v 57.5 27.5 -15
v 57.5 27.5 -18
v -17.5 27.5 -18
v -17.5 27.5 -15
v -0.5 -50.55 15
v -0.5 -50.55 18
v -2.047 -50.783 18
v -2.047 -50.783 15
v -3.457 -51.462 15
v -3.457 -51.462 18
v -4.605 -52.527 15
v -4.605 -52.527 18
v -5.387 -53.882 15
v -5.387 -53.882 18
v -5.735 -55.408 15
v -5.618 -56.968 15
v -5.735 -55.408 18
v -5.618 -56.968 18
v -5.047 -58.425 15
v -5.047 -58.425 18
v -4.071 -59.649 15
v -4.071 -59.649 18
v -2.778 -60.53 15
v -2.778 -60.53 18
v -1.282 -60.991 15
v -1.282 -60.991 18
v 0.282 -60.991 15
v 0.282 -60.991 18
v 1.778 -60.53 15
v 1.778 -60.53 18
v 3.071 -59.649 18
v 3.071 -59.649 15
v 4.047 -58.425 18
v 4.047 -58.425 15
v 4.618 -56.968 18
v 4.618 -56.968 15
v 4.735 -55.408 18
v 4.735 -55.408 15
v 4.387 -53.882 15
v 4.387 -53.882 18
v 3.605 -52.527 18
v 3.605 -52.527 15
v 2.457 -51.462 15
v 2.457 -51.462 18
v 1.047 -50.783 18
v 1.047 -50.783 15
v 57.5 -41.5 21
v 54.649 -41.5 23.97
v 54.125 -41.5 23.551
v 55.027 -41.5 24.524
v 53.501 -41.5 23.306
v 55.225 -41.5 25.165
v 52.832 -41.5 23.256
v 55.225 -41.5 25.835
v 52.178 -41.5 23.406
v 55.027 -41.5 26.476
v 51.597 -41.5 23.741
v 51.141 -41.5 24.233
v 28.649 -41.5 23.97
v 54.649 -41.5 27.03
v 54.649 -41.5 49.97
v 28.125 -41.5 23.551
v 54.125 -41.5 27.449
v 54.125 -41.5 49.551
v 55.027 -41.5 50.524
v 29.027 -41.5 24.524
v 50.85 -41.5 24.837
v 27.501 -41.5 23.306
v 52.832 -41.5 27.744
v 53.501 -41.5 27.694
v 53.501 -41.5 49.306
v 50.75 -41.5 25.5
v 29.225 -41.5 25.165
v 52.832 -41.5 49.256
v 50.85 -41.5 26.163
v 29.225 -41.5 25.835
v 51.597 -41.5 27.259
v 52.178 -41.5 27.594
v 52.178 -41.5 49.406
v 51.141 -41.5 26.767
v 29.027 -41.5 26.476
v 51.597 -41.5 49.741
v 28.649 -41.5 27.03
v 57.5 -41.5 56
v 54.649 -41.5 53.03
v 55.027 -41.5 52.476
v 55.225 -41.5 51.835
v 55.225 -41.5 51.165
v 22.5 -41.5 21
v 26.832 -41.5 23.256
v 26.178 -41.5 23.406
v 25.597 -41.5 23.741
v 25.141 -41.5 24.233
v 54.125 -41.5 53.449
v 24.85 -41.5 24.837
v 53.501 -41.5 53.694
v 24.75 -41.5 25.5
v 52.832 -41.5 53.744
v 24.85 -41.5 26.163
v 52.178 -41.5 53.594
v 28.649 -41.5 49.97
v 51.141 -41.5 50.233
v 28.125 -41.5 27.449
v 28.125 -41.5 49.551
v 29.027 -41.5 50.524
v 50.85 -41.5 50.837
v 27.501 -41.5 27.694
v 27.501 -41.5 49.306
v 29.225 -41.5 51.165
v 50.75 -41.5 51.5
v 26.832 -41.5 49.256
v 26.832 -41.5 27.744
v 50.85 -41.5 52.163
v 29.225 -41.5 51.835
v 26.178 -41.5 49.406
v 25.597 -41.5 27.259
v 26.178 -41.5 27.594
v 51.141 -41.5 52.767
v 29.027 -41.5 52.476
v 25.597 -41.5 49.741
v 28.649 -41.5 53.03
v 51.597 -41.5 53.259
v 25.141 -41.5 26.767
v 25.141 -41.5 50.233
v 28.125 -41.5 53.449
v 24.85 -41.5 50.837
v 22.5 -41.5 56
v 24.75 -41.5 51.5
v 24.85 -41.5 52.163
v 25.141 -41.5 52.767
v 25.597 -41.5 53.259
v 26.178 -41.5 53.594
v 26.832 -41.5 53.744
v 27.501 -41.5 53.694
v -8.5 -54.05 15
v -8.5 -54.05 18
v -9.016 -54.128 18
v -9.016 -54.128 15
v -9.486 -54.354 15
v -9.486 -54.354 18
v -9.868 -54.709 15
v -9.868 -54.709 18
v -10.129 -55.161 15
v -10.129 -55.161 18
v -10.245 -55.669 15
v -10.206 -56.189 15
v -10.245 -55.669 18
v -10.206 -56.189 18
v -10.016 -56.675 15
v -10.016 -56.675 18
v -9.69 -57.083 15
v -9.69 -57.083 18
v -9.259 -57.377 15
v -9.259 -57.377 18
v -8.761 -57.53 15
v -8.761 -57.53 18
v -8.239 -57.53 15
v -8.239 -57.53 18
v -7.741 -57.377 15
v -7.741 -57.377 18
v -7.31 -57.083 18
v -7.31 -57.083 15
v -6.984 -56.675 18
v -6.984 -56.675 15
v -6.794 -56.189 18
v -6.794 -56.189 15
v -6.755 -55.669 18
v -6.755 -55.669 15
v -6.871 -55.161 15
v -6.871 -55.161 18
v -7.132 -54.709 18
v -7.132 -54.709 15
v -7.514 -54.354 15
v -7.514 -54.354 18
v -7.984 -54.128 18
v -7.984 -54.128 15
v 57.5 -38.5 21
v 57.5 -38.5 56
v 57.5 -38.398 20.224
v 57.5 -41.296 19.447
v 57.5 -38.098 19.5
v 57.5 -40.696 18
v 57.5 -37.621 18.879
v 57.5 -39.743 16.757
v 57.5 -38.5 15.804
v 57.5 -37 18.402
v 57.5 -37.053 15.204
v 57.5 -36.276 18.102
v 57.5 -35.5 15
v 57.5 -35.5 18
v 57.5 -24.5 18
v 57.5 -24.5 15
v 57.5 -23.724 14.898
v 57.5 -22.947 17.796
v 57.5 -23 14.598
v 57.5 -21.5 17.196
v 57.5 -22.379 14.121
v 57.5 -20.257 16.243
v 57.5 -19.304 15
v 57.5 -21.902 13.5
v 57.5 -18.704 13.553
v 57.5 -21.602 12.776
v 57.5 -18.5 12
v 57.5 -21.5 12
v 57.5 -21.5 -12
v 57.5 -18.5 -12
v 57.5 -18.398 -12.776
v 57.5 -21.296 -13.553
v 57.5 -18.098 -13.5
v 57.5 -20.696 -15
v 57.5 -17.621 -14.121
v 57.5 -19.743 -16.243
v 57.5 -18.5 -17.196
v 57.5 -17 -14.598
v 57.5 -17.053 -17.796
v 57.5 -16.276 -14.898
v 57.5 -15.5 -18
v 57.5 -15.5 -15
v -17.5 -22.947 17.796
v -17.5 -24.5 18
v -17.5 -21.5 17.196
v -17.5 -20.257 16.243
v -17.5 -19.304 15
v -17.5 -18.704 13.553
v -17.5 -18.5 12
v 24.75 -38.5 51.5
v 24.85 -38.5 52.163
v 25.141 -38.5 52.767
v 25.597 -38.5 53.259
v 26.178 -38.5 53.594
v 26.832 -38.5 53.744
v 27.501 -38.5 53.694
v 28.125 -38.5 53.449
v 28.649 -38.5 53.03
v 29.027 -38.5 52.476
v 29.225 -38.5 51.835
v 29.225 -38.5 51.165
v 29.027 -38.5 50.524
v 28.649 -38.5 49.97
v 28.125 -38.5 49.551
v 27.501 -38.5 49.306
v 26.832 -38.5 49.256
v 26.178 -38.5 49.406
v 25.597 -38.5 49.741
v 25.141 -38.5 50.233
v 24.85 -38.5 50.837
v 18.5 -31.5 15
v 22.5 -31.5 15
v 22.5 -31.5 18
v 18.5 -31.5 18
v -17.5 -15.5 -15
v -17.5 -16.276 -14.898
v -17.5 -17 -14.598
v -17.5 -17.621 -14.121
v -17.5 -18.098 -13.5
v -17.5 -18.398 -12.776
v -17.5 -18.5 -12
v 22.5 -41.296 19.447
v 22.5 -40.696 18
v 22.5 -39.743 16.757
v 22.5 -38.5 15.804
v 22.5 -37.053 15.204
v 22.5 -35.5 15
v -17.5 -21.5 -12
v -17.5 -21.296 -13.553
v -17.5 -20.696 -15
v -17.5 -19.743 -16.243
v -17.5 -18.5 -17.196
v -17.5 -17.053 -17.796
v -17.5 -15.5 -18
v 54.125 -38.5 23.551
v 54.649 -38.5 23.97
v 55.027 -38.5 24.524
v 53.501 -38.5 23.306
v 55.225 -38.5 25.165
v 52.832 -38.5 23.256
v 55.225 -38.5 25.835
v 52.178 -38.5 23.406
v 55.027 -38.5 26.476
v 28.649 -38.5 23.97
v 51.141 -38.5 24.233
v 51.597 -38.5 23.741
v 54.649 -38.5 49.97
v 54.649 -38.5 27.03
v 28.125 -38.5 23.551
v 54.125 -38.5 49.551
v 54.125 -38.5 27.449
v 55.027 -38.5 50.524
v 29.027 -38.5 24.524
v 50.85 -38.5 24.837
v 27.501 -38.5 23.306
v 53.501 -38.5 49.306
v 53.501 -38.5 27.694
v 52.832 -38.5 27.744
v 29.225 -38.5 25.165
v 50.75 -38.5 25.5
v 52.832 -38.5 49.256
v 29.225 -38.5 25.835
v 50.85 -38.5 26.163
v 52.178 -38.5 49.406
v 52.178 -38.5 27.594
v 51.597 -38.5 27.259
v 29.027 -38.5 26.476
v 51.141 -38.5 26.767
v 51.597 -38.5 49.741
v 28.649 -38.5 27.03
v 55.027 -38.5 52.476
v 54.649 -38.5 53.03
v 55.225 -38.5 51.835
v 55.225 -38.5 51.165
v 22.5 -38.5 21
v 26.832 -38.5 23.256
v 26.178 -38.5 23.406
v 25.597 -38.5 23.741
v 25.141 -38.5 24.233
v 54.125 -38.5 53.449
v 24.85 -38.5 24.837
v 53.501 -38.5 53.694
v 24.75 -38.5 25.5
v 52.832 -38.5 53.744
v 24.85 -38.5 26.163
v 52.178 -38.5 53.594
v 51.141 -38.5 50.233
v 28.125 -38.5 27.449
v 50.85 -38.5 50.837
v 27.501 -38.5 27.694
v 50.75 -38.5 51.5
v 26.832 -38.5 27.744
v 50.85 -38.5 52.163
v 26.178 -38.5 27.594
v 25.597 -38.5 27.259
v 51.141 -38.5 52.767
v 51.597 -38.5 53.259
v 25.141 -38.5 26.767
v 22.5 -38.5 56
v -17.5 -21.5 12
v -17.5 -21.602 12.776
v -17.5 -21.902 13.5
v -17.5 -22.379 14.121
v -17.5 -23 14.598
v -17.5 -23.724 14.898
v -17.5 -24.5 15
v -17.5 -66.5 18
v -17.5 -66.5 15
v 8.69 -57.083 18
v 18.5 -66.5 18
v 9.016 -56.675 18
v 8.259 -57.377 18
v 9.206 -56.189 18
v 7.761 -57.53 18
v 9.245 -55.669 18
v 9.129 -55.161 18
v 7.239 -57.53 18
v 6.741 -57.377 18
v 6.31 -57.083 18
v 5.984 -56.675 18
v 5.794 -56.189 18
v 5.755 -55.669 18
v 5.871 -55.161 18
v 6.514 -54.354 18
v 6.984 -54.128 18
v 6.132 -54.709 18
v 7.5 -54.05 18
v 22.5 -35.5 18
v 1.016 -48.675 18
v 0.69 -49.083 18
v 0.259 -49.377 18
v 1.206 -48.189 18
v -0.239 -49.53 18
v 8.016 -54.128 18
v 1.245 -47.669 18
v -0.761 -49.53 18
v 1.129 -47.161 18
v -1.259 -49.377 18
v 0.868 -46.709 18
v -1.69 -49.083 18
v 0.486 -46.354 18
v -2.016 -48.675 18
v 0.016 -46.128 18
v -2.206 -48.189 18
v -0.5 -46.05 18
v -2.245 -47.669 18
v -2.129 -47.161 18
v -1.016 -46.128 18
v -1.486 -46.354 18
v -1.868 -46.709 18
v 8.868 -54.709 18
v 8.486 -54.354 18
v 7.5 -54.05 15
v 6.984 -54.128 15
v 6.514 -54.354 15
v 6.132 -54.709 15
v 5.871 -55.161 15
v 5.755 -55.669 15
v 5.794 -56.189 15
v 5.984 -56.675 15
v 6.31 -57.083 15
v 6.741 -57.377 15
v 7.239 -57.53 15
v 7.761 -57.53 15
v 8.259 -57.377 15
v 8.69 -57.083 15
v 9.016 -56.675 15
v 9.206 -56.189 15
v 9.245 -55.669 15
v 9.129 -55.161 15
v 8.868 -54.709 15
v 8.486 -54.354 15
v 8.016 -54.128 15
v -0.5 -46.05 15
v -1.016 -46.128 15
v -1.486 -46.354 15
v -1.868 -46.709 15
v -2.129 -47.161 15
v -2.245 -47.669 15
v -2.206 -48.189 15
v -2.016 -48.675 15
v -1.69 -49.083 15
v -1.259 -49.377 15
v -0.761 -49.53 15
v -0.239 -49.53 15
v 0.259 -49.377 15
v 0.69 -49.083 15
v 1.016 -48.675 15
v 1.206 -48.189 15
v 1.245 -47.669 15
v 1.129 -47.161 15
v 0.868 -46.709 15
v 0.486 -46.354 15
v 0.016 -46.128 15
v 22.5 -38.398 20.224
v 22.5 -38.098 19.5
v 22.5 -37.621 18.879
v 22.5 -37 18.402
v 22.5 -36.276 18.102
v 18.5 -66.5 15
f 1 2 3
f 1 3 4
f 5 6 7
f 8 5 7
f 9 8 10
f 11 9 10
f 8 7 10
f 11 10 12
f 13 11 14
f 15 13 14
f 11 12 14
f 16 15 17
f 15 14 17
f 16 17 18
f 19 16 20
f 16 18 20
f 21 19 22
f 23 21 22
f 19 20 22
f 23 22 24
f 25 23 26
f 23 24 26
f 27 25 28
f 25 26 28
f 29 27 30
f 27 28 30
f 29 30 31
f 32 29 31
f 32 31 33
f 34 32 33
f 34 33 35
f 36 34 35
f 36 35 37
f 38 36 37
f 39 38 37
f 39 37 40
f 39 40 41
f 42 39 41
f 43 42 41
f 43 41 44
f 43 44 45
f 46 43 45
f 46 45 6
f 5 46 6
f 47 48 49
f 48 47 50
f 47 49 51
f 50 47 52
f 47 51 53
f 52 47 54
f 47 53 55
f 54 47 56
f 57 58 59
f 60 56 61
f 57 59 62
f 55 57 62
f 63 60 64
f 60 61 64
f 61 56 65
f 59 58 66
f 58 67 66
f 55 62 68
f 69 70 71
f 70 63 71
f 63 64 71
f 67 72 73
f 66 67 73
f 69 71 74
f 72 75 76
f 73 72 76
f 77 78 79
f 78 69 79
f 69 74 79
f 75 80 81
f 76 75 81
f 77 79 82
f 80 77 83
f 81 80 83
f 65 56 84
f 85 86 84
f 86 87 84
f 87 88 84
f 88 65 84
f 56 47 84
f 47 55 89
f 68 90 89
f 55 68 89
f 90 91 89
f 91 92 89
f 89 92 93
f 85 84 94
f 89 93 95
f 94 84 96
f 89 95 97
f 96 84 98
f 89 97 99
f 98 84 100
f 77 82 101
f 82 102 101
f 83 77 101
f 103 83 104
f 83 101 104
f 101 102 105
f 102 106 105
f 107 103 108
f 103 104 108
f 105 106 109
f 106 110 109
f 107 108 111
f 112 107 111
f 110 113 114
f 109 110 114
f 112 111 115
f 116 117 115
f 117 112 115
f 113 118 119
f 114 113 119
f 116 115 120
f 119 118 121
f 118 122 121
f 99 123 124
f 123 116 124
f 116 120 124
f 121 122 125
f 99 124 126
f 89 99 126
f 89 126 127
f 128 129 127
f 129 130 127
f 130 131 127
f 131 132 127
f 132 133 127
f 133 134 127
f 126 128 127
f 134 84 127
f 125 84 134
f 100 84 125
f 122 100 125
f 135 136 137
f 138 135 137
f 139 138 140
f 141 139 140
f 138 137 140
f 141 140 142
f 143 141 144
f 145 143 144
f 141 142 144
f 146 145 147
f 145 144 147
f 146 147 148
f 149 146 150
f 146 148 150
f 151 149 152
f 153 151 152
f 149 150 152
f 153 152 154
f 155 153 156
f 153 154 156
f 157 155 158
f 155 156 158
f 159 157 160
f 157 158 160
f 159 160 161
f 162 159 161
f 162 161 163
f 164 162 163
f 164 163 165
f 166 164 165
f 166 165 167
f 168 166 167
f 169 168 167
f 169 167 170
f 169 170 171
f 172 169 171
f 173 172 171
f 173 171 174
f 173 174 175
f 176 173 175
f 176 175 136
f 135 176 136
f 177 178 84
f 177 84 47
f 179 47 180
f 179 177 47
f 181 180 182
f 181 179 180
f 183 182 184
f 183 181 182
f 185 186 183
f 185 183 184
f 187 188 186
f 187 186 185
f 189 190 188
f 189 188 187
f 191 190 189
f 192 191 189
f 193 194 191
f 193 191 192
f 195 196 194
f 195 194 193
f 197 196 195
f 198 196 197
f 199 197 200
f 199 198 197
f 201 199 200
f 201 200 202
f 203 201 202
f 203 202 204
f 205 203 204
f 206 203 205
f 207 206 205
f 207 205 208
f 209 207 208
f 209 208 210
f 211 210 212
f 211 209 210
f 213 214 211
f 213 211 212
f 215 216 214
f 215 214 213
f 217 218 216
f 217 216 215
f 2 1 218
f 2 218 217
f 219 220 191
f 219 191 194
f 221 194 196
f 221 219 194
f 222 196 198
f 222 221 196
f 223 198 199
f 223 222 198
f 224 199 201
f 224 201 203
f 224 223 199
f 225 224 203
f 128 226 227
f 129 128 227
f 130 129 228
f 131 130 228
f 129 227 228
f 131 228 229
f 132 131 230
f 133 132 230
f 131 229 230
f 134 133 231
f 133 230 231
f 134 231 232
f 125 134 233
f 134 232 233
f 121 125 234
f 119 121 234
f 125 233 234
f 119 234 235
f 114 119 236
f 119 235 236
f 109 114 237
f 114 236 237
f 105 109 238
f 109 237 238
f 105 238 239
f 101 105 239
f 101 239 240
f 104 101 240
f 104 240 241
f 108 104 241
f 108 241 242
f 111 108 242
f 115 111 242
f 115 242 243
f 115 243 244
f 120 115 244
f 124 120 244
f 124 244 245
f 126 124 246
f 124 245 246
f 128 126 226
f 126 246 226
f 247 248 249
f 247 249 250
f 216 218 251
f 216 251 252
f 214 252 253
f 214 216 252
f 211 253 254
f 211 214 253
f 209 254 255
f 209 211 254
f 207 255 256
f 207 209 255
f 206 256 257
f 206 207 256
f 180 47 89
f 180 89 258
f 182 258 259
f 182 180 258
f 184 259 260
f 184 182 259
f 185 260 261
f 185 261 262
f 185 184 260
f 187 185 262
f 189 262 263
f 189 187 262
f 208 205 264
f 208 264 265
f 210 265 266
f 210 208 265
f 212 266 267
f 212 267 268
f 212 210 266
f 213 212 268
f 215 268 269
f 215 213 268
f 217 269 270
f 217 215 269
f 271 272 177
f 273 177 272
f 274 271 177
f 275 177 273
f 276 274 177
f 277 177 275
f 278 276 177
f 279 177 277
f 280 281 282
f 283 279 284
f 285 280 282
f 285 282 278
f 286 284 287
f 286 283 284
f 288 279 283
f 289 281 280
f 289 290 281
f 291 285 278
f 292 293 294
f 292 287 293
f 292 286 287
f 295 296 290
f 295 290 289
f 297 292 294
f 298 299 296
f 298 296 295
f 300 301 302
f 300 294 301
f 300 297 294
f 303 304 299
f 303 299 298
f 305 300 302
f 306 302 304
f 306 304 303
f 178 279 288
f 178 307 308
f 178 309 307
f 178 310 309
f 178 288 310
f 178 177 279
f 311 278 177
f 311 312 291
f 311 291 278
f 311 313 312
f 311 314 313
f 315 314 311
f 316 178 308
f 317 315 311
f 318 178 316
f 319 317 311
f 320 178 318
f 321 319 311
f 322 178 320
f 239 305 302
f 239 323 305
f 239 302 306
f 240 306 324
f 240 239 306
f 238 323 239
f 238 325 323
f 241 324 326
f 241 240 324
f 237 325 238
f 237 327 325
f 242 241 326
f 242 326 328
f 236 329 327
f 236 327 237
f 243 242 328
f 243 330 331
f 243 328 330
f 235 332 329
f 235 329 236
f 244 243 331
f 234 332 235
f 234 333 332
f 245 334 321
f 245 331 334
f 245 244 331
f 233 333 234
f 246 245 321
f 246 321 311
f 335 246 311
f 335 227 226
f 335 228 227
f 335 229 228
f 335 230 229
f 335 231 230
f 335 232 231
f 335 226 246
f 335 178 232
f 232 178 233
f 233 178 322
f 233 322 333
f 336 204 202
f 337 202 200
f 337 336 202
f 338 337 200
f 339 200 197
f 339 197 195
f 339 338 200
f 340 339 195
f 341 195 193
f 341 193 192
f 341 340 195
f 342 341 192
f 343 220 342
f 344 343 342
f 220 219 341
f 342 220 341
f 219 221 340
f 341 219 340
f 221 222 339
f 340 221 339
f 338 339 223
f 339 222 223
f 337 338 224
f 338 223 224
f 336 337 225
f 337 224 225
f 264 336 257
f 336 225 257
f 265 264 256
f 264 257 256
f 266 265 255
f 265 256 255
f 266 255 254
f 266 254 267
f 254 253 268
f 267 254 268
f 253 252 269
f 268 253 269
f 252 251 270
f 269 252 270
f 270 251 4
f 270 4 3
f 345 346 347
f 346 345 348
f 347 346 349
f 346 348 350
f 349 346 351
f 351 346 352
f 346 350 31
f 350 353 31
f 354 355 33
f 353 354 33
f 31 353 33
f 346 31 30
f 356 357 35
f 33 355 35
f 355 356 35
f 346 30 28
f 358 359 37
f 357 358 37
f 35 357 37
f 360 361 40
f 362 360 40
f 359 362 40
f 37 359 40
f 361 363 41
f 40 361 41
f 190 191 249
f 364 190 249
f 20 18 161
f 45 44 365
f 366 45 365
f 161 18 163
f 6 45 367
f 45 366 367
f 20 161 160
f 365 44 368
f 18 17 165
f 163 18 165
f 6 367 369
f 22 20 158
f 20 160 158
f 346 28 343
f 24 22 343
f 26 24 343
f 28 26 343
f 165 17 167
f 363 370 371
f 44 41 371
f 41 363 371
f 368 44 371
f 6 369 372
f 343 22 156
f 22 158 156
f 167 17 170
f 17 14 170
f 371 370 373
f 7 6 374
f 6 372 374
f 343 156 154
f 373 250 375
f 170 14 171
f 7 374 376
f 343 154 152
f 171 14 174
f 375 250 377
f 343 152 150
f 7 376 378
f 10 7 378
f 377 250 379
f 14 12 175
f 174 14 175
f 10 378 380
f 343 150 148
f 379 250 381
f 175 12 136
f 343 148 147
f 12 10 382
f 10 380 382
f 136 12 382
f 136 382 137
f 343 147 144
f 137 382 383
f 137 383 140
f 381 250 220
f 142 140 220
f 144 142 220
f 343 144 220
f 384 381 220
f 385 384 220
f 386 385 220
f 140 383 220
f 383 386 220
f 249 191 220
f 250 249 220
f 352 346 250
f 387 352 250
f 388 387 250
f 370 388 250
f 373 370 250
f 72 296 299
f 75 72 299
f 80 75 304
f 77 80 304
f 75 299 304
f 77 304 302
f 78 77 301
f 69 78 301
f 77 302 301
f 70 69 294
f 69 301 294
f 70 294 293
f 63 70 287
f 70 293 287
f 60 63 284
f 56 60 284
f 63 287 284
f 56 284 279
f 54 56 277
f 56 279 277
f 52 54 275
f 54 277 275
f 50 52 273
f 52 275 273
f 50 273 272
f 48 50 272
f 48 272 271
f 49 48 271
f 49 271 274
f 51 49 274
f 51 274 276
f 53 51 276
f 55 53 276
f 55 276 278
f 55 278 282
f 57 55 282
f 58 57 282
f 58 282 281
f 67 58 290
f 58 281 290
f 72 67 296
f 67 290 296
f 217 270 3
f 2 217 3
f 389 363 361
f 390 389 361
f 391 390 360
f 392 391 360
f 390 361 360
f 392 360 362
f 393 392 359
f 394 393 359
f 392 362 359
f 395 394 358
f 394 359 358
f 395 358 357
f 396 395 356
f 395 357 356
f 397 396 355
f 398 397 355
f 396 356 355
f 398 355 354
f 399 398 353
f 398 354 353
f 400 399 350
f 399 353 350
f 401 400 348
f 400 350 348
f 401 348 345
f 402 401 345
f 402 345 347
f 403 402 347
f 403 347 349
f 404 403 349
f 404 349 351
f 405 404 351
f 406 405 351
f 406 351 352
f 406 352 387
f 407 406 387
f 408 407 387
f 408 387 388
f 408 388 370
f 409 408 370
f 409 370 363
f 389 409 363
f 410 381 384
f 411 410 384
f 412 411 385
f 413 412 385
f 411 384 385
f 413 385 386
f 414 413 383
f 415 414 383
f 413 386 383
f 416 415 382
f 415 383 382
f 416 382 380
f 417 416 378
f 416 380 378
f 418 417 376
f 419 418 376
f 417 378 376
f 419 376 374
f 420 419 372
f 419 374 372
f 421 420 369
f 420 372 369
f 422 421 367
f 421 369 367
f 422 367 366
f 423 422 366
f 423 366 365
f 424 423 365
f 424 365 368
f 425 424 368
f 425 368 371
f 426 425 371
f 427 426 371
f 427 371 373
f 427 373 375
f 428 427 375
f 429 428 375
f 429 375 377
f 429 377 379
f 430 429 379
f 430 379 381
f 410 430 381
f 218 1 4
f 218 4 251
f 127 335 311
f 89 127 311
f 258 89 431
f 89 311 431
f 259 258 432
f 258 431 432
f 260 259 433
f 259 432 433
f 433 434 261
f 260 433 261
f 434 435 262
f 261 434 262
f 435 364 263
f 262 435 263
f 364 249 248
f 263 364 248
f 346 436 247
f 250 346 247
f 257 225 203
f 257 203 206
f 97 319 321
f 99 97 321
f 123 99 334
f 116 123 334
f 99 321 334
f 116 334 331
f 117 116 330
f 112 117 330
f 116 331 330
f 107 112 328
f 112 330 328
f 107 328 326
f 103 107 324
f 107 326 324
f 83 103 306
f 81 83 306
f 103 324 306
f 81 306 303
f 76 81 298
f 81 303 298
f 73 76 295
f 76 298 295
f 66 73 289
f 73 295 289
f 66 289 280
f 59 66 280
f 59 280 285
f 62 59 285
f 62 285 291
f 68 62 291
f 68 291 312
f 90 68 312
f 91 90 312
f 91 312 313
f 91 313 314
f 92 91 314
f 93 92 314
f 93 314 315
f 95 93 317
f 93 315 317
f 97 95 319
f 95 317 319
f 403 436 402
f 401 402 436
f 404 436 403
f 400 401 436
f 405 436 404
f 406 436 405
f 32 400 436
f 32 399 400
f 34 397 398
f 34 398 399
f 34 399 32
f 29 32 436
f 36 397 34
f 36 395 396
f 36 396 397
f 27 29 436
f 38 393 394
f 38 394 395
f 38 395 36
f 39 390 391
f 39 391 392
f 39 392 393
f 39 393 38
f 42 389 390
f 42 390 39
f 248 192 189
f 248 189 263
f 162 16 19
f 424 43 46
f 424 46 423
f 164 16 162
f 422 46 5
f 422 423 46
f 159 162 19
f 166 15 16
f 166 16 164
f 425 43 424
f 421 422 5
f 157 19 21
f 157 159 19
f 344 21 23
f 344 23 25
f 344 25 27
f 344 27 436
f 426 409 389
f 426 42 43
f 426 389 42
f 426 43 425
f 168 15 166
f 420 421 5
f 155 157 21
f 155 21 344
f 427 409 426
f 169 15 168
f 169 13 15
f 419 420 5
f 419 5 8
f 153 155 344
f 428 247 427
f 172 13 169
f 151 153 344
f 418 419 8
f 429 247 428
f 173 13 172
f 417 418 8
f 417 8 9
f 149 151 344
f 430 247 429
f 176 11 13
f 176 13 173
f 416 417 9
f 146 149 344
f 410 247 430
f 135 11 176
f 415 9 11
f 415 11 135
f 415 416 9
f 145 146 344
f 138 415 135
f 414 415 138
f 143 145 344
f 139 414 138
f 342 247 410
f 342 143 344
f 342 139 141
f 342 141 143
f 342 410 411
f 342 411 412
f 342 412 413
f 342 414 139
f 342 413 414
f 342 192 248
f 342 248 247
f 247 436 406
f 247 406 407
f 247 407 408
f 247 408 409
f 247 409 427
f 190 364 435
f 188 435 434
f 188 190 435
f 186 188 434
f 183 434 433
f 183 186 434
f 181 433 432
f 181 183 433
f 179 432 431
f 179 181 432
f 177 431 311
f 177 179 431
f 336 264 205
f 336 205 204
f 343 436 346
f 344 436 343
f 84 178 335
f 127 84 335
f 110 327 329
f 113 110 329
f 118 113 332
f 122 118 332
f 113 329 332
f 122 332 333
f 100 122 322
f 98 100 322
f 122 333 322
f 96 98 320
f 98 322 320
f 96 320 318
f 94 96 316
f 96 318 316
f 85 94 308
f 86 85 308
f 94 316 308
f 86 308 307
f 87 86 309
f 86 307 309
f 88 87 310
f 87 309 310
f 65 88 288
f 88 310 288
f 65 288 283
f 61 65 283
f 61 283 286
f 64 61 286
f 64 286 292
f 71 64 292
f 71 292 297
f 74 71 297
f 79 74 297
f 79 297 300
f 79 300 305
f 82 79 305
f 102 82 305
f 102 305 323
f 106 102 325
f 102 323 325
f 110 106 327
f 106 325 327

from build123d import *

# Parameters (mm, degrees)
SKETCH1_W                    = 35
SKETCH1_H                    = 35
SKETCH1_R                    = 2.25
BASE_FLANGE1_DEPTH           = 3
EDGE_FLANGE1_DEPTH           = 35
SKETCH9_W                    = 36
SKETCH9_H                    = 35
BOSS_EXTRUDE1_DEPTH          = 3
EDGE_FLANGE2_STRIP_W         = 18
EDGE_FLANGE2_STRIP_H         = 3
EDGE_FLANGE2_STRIP_CUT_DEPTH = 75
EDGE_FLANGE2_DEPTH           = 75
EDGE_FLANGE3_STRIP_W         = 18
EDGE_FLANGE3_STRIP_H         = 3
EDGE_FLANGE3_STRIP_CUT_DEPTH = 75
EDGE_FLANGE3_DEPTH           = 75
SKETCH16_R                   = 5.25
SKETCH16_R_2                 = 1.75
CUT_EXTRUDE1_DEPTH           = 10
BODY_MOVE_COPY1_ANGLE        = 180


# Sheet-metal steps are written as plain solids
with BuildPart() as part:
    # Sketch1 → Base-Flange1 (new body)
    with BuildSketch(Plane.XY):
        Rectangle(SKETCH1_W, SKETCH1_H)
        with Locations((-13, 13)):
            Circle(SKETCH1_R, mode=Mode.SUBTRACT)
        with Locations((13, 13)):
            Circle(SKETCH1_R, mode=Mode.SUBTRACT)
        with Locations((13, -13)):
            Circle(SKETCH1_R, mode=Mode.SUBTRACT)
        with Locations((-13, -13)):
            Circle(SKETCH1_R, mode=Mode.SUBTRACT)
    extrude(amount=-BASE_FLANGE1_DEPTH)

    # Edge-Flange1 section (across the edge) → Edge-Flange1 (add)
    with BuildSketch(Plane(origin=(-17.5, -20.5, 0), x_dir=(0, 1, 0), z_dir=(1, 0, 0))):
        with BuildLine():
            Line((-3, 3), (-3, 17))
            Line((-3, 17), (0, 17))
            Line((0, 17), (0, 3))
            ThreePointArc((0, 3), (0.878679656, 0.878679656), (3, 0))
            Line((3, 0), (3, -3))
            ThreePointArc((3, -3), (-1.242640687, -1.242640687), (-3, 3))
        make_face()
    extrude(amount=EDGE_FLANGE1_DEPTH)

    # Sketch9 → Boss-Extrude1 (add)
    with BuildSketch(Plane.XZ.offset(23.5)):
        Polygon((57.5, 17), (17.5, 17), (17.5, 7), (21.5, 7), (57.5, 7), align=None)
        with Locations((39.5, -10.5)):
            Rectangle(SKETCH9_W, SKETCH9_H)
    extrude(amount=-BOSS_EXTRUDE1_DEPTH)

    # Edge-Flange2 strip (across the edge) → Edge-Flange2 strip cut (cut)
    with BuildSketch(Plane(origin=(57.5, -23.5, 17), x_dir=(0, 0, -1), z_dir=(-1, 0, 0))):
        with Locations((-6, -1.5)):
            Rectangle(EDGE_FLANGE2_STRIP_W, EDGE_FLANGE2_STRIP_H)
    extrude(amount=EDGE_FLANGE2_STRIP_CUT_DEPTH, mode=Mode.SUBTRACT)

    # Edge-Flange2 section (across the edge) → Edge-Flange2 (add)
    with BuildSketch(Plane(origin=(57.5, -23.5, 17), x_dir=(0, 0, -1), z_dir=(-1, 0, 0))):
        with BuildLine():
            Line((-3, 3), (-3, 30))
            Line((-3, 30), (0, 30))
            Line((0, 30), (0, 3))
            ThreePointArc((0, 3), (0.878679656, 0.878679656), (3, 0))
            Line((3, 0), (3, -3))
            ThreePointArc((3, -3), (-1.242640687, -1.242640687), (-3, 3))
        make_face()
    extrude(amount=EDGE_FLANGE2_DEPTH)

    # Edge-Flange3 strip (across the edge) → Edge-Flange3 strip cut (cut)
    with BuildSketch(Plane(origin=(-17.5, -53.5, 20), x_dir=(0, 1, 0), z_dir=(1, 0, 0))):
        with Locations((-6, -1.5)):
            Rectangle(EDGE_FLANGE3_STRIP_W, EDGE_FLANGE3_STRIP_H)
    extrude(amount=EDGE_FLANGE3_STRIP_CUT_DEPTH, mode=Mode.SUBTRACT)

    # Edge-Flange3 section (across the edge) → Edge-Flange3 (add)
    with BuildSketch(Plane(origin=(-17.5, -53.5, 20), x_dir=(0, 1, 0), z_dir=(1, 0, 0))):
        with BuildLine():
            Line((-3, 3), (-3, 46))
            Line((-3, 46), (0, 46))
            Line((0, 46), (0, 3))
            ThreePointArc((0, 3), (0.878679656, 0.878679656), (3, 0))
            Line((3, 0), (3, -3))
            ThreePointArc((3, -3), (-1.242640687, -1.242640687), (-3, 3))
        make_face()
    extrude(amount=EDGE_FLANGE3_DEPTH)

    # Sketch16 → Cut-Extrude1 (cut)
    with BuildSketch(Plane(origin=(0, -20.5, 0), x_dir=(1, 0, 0), z_dir=(0, 1, 0))):
        with Locations(Location((40.5, 17.3, 0), (0, 0, 270))):
            Circle(SKETCH16_R)
        with Locations(Location((40.5, 9.3, 0), (0, 0, 270))):
            Circle(SKETCH16_R_2)
        with Locations(Location((48.5, 17.3, 0), (0, 0, 270))):
            Circle(SKETCH16_R_2)
        with Locations(Location((32.5, 17.3, 0), (0, 0, 270))):
            Circle(SKETCH16_R_2)
    extrude(amount=-CUT_EXTRUDE1_DEPTH, mode=Mode.SUBTRACT)


with BuildPart() as part_1:
    # Body-Move/Copy1: moved
    add(part.part.moved(Location((0, 0, 0))).rotate(Axis((20, -19.25, 19.25), (-4.937700262163626e-15, 0.7071067811864181, 0.707106781186677)), BODY_MOVE_COPY1_ANGLE))


solid = part_1.part
